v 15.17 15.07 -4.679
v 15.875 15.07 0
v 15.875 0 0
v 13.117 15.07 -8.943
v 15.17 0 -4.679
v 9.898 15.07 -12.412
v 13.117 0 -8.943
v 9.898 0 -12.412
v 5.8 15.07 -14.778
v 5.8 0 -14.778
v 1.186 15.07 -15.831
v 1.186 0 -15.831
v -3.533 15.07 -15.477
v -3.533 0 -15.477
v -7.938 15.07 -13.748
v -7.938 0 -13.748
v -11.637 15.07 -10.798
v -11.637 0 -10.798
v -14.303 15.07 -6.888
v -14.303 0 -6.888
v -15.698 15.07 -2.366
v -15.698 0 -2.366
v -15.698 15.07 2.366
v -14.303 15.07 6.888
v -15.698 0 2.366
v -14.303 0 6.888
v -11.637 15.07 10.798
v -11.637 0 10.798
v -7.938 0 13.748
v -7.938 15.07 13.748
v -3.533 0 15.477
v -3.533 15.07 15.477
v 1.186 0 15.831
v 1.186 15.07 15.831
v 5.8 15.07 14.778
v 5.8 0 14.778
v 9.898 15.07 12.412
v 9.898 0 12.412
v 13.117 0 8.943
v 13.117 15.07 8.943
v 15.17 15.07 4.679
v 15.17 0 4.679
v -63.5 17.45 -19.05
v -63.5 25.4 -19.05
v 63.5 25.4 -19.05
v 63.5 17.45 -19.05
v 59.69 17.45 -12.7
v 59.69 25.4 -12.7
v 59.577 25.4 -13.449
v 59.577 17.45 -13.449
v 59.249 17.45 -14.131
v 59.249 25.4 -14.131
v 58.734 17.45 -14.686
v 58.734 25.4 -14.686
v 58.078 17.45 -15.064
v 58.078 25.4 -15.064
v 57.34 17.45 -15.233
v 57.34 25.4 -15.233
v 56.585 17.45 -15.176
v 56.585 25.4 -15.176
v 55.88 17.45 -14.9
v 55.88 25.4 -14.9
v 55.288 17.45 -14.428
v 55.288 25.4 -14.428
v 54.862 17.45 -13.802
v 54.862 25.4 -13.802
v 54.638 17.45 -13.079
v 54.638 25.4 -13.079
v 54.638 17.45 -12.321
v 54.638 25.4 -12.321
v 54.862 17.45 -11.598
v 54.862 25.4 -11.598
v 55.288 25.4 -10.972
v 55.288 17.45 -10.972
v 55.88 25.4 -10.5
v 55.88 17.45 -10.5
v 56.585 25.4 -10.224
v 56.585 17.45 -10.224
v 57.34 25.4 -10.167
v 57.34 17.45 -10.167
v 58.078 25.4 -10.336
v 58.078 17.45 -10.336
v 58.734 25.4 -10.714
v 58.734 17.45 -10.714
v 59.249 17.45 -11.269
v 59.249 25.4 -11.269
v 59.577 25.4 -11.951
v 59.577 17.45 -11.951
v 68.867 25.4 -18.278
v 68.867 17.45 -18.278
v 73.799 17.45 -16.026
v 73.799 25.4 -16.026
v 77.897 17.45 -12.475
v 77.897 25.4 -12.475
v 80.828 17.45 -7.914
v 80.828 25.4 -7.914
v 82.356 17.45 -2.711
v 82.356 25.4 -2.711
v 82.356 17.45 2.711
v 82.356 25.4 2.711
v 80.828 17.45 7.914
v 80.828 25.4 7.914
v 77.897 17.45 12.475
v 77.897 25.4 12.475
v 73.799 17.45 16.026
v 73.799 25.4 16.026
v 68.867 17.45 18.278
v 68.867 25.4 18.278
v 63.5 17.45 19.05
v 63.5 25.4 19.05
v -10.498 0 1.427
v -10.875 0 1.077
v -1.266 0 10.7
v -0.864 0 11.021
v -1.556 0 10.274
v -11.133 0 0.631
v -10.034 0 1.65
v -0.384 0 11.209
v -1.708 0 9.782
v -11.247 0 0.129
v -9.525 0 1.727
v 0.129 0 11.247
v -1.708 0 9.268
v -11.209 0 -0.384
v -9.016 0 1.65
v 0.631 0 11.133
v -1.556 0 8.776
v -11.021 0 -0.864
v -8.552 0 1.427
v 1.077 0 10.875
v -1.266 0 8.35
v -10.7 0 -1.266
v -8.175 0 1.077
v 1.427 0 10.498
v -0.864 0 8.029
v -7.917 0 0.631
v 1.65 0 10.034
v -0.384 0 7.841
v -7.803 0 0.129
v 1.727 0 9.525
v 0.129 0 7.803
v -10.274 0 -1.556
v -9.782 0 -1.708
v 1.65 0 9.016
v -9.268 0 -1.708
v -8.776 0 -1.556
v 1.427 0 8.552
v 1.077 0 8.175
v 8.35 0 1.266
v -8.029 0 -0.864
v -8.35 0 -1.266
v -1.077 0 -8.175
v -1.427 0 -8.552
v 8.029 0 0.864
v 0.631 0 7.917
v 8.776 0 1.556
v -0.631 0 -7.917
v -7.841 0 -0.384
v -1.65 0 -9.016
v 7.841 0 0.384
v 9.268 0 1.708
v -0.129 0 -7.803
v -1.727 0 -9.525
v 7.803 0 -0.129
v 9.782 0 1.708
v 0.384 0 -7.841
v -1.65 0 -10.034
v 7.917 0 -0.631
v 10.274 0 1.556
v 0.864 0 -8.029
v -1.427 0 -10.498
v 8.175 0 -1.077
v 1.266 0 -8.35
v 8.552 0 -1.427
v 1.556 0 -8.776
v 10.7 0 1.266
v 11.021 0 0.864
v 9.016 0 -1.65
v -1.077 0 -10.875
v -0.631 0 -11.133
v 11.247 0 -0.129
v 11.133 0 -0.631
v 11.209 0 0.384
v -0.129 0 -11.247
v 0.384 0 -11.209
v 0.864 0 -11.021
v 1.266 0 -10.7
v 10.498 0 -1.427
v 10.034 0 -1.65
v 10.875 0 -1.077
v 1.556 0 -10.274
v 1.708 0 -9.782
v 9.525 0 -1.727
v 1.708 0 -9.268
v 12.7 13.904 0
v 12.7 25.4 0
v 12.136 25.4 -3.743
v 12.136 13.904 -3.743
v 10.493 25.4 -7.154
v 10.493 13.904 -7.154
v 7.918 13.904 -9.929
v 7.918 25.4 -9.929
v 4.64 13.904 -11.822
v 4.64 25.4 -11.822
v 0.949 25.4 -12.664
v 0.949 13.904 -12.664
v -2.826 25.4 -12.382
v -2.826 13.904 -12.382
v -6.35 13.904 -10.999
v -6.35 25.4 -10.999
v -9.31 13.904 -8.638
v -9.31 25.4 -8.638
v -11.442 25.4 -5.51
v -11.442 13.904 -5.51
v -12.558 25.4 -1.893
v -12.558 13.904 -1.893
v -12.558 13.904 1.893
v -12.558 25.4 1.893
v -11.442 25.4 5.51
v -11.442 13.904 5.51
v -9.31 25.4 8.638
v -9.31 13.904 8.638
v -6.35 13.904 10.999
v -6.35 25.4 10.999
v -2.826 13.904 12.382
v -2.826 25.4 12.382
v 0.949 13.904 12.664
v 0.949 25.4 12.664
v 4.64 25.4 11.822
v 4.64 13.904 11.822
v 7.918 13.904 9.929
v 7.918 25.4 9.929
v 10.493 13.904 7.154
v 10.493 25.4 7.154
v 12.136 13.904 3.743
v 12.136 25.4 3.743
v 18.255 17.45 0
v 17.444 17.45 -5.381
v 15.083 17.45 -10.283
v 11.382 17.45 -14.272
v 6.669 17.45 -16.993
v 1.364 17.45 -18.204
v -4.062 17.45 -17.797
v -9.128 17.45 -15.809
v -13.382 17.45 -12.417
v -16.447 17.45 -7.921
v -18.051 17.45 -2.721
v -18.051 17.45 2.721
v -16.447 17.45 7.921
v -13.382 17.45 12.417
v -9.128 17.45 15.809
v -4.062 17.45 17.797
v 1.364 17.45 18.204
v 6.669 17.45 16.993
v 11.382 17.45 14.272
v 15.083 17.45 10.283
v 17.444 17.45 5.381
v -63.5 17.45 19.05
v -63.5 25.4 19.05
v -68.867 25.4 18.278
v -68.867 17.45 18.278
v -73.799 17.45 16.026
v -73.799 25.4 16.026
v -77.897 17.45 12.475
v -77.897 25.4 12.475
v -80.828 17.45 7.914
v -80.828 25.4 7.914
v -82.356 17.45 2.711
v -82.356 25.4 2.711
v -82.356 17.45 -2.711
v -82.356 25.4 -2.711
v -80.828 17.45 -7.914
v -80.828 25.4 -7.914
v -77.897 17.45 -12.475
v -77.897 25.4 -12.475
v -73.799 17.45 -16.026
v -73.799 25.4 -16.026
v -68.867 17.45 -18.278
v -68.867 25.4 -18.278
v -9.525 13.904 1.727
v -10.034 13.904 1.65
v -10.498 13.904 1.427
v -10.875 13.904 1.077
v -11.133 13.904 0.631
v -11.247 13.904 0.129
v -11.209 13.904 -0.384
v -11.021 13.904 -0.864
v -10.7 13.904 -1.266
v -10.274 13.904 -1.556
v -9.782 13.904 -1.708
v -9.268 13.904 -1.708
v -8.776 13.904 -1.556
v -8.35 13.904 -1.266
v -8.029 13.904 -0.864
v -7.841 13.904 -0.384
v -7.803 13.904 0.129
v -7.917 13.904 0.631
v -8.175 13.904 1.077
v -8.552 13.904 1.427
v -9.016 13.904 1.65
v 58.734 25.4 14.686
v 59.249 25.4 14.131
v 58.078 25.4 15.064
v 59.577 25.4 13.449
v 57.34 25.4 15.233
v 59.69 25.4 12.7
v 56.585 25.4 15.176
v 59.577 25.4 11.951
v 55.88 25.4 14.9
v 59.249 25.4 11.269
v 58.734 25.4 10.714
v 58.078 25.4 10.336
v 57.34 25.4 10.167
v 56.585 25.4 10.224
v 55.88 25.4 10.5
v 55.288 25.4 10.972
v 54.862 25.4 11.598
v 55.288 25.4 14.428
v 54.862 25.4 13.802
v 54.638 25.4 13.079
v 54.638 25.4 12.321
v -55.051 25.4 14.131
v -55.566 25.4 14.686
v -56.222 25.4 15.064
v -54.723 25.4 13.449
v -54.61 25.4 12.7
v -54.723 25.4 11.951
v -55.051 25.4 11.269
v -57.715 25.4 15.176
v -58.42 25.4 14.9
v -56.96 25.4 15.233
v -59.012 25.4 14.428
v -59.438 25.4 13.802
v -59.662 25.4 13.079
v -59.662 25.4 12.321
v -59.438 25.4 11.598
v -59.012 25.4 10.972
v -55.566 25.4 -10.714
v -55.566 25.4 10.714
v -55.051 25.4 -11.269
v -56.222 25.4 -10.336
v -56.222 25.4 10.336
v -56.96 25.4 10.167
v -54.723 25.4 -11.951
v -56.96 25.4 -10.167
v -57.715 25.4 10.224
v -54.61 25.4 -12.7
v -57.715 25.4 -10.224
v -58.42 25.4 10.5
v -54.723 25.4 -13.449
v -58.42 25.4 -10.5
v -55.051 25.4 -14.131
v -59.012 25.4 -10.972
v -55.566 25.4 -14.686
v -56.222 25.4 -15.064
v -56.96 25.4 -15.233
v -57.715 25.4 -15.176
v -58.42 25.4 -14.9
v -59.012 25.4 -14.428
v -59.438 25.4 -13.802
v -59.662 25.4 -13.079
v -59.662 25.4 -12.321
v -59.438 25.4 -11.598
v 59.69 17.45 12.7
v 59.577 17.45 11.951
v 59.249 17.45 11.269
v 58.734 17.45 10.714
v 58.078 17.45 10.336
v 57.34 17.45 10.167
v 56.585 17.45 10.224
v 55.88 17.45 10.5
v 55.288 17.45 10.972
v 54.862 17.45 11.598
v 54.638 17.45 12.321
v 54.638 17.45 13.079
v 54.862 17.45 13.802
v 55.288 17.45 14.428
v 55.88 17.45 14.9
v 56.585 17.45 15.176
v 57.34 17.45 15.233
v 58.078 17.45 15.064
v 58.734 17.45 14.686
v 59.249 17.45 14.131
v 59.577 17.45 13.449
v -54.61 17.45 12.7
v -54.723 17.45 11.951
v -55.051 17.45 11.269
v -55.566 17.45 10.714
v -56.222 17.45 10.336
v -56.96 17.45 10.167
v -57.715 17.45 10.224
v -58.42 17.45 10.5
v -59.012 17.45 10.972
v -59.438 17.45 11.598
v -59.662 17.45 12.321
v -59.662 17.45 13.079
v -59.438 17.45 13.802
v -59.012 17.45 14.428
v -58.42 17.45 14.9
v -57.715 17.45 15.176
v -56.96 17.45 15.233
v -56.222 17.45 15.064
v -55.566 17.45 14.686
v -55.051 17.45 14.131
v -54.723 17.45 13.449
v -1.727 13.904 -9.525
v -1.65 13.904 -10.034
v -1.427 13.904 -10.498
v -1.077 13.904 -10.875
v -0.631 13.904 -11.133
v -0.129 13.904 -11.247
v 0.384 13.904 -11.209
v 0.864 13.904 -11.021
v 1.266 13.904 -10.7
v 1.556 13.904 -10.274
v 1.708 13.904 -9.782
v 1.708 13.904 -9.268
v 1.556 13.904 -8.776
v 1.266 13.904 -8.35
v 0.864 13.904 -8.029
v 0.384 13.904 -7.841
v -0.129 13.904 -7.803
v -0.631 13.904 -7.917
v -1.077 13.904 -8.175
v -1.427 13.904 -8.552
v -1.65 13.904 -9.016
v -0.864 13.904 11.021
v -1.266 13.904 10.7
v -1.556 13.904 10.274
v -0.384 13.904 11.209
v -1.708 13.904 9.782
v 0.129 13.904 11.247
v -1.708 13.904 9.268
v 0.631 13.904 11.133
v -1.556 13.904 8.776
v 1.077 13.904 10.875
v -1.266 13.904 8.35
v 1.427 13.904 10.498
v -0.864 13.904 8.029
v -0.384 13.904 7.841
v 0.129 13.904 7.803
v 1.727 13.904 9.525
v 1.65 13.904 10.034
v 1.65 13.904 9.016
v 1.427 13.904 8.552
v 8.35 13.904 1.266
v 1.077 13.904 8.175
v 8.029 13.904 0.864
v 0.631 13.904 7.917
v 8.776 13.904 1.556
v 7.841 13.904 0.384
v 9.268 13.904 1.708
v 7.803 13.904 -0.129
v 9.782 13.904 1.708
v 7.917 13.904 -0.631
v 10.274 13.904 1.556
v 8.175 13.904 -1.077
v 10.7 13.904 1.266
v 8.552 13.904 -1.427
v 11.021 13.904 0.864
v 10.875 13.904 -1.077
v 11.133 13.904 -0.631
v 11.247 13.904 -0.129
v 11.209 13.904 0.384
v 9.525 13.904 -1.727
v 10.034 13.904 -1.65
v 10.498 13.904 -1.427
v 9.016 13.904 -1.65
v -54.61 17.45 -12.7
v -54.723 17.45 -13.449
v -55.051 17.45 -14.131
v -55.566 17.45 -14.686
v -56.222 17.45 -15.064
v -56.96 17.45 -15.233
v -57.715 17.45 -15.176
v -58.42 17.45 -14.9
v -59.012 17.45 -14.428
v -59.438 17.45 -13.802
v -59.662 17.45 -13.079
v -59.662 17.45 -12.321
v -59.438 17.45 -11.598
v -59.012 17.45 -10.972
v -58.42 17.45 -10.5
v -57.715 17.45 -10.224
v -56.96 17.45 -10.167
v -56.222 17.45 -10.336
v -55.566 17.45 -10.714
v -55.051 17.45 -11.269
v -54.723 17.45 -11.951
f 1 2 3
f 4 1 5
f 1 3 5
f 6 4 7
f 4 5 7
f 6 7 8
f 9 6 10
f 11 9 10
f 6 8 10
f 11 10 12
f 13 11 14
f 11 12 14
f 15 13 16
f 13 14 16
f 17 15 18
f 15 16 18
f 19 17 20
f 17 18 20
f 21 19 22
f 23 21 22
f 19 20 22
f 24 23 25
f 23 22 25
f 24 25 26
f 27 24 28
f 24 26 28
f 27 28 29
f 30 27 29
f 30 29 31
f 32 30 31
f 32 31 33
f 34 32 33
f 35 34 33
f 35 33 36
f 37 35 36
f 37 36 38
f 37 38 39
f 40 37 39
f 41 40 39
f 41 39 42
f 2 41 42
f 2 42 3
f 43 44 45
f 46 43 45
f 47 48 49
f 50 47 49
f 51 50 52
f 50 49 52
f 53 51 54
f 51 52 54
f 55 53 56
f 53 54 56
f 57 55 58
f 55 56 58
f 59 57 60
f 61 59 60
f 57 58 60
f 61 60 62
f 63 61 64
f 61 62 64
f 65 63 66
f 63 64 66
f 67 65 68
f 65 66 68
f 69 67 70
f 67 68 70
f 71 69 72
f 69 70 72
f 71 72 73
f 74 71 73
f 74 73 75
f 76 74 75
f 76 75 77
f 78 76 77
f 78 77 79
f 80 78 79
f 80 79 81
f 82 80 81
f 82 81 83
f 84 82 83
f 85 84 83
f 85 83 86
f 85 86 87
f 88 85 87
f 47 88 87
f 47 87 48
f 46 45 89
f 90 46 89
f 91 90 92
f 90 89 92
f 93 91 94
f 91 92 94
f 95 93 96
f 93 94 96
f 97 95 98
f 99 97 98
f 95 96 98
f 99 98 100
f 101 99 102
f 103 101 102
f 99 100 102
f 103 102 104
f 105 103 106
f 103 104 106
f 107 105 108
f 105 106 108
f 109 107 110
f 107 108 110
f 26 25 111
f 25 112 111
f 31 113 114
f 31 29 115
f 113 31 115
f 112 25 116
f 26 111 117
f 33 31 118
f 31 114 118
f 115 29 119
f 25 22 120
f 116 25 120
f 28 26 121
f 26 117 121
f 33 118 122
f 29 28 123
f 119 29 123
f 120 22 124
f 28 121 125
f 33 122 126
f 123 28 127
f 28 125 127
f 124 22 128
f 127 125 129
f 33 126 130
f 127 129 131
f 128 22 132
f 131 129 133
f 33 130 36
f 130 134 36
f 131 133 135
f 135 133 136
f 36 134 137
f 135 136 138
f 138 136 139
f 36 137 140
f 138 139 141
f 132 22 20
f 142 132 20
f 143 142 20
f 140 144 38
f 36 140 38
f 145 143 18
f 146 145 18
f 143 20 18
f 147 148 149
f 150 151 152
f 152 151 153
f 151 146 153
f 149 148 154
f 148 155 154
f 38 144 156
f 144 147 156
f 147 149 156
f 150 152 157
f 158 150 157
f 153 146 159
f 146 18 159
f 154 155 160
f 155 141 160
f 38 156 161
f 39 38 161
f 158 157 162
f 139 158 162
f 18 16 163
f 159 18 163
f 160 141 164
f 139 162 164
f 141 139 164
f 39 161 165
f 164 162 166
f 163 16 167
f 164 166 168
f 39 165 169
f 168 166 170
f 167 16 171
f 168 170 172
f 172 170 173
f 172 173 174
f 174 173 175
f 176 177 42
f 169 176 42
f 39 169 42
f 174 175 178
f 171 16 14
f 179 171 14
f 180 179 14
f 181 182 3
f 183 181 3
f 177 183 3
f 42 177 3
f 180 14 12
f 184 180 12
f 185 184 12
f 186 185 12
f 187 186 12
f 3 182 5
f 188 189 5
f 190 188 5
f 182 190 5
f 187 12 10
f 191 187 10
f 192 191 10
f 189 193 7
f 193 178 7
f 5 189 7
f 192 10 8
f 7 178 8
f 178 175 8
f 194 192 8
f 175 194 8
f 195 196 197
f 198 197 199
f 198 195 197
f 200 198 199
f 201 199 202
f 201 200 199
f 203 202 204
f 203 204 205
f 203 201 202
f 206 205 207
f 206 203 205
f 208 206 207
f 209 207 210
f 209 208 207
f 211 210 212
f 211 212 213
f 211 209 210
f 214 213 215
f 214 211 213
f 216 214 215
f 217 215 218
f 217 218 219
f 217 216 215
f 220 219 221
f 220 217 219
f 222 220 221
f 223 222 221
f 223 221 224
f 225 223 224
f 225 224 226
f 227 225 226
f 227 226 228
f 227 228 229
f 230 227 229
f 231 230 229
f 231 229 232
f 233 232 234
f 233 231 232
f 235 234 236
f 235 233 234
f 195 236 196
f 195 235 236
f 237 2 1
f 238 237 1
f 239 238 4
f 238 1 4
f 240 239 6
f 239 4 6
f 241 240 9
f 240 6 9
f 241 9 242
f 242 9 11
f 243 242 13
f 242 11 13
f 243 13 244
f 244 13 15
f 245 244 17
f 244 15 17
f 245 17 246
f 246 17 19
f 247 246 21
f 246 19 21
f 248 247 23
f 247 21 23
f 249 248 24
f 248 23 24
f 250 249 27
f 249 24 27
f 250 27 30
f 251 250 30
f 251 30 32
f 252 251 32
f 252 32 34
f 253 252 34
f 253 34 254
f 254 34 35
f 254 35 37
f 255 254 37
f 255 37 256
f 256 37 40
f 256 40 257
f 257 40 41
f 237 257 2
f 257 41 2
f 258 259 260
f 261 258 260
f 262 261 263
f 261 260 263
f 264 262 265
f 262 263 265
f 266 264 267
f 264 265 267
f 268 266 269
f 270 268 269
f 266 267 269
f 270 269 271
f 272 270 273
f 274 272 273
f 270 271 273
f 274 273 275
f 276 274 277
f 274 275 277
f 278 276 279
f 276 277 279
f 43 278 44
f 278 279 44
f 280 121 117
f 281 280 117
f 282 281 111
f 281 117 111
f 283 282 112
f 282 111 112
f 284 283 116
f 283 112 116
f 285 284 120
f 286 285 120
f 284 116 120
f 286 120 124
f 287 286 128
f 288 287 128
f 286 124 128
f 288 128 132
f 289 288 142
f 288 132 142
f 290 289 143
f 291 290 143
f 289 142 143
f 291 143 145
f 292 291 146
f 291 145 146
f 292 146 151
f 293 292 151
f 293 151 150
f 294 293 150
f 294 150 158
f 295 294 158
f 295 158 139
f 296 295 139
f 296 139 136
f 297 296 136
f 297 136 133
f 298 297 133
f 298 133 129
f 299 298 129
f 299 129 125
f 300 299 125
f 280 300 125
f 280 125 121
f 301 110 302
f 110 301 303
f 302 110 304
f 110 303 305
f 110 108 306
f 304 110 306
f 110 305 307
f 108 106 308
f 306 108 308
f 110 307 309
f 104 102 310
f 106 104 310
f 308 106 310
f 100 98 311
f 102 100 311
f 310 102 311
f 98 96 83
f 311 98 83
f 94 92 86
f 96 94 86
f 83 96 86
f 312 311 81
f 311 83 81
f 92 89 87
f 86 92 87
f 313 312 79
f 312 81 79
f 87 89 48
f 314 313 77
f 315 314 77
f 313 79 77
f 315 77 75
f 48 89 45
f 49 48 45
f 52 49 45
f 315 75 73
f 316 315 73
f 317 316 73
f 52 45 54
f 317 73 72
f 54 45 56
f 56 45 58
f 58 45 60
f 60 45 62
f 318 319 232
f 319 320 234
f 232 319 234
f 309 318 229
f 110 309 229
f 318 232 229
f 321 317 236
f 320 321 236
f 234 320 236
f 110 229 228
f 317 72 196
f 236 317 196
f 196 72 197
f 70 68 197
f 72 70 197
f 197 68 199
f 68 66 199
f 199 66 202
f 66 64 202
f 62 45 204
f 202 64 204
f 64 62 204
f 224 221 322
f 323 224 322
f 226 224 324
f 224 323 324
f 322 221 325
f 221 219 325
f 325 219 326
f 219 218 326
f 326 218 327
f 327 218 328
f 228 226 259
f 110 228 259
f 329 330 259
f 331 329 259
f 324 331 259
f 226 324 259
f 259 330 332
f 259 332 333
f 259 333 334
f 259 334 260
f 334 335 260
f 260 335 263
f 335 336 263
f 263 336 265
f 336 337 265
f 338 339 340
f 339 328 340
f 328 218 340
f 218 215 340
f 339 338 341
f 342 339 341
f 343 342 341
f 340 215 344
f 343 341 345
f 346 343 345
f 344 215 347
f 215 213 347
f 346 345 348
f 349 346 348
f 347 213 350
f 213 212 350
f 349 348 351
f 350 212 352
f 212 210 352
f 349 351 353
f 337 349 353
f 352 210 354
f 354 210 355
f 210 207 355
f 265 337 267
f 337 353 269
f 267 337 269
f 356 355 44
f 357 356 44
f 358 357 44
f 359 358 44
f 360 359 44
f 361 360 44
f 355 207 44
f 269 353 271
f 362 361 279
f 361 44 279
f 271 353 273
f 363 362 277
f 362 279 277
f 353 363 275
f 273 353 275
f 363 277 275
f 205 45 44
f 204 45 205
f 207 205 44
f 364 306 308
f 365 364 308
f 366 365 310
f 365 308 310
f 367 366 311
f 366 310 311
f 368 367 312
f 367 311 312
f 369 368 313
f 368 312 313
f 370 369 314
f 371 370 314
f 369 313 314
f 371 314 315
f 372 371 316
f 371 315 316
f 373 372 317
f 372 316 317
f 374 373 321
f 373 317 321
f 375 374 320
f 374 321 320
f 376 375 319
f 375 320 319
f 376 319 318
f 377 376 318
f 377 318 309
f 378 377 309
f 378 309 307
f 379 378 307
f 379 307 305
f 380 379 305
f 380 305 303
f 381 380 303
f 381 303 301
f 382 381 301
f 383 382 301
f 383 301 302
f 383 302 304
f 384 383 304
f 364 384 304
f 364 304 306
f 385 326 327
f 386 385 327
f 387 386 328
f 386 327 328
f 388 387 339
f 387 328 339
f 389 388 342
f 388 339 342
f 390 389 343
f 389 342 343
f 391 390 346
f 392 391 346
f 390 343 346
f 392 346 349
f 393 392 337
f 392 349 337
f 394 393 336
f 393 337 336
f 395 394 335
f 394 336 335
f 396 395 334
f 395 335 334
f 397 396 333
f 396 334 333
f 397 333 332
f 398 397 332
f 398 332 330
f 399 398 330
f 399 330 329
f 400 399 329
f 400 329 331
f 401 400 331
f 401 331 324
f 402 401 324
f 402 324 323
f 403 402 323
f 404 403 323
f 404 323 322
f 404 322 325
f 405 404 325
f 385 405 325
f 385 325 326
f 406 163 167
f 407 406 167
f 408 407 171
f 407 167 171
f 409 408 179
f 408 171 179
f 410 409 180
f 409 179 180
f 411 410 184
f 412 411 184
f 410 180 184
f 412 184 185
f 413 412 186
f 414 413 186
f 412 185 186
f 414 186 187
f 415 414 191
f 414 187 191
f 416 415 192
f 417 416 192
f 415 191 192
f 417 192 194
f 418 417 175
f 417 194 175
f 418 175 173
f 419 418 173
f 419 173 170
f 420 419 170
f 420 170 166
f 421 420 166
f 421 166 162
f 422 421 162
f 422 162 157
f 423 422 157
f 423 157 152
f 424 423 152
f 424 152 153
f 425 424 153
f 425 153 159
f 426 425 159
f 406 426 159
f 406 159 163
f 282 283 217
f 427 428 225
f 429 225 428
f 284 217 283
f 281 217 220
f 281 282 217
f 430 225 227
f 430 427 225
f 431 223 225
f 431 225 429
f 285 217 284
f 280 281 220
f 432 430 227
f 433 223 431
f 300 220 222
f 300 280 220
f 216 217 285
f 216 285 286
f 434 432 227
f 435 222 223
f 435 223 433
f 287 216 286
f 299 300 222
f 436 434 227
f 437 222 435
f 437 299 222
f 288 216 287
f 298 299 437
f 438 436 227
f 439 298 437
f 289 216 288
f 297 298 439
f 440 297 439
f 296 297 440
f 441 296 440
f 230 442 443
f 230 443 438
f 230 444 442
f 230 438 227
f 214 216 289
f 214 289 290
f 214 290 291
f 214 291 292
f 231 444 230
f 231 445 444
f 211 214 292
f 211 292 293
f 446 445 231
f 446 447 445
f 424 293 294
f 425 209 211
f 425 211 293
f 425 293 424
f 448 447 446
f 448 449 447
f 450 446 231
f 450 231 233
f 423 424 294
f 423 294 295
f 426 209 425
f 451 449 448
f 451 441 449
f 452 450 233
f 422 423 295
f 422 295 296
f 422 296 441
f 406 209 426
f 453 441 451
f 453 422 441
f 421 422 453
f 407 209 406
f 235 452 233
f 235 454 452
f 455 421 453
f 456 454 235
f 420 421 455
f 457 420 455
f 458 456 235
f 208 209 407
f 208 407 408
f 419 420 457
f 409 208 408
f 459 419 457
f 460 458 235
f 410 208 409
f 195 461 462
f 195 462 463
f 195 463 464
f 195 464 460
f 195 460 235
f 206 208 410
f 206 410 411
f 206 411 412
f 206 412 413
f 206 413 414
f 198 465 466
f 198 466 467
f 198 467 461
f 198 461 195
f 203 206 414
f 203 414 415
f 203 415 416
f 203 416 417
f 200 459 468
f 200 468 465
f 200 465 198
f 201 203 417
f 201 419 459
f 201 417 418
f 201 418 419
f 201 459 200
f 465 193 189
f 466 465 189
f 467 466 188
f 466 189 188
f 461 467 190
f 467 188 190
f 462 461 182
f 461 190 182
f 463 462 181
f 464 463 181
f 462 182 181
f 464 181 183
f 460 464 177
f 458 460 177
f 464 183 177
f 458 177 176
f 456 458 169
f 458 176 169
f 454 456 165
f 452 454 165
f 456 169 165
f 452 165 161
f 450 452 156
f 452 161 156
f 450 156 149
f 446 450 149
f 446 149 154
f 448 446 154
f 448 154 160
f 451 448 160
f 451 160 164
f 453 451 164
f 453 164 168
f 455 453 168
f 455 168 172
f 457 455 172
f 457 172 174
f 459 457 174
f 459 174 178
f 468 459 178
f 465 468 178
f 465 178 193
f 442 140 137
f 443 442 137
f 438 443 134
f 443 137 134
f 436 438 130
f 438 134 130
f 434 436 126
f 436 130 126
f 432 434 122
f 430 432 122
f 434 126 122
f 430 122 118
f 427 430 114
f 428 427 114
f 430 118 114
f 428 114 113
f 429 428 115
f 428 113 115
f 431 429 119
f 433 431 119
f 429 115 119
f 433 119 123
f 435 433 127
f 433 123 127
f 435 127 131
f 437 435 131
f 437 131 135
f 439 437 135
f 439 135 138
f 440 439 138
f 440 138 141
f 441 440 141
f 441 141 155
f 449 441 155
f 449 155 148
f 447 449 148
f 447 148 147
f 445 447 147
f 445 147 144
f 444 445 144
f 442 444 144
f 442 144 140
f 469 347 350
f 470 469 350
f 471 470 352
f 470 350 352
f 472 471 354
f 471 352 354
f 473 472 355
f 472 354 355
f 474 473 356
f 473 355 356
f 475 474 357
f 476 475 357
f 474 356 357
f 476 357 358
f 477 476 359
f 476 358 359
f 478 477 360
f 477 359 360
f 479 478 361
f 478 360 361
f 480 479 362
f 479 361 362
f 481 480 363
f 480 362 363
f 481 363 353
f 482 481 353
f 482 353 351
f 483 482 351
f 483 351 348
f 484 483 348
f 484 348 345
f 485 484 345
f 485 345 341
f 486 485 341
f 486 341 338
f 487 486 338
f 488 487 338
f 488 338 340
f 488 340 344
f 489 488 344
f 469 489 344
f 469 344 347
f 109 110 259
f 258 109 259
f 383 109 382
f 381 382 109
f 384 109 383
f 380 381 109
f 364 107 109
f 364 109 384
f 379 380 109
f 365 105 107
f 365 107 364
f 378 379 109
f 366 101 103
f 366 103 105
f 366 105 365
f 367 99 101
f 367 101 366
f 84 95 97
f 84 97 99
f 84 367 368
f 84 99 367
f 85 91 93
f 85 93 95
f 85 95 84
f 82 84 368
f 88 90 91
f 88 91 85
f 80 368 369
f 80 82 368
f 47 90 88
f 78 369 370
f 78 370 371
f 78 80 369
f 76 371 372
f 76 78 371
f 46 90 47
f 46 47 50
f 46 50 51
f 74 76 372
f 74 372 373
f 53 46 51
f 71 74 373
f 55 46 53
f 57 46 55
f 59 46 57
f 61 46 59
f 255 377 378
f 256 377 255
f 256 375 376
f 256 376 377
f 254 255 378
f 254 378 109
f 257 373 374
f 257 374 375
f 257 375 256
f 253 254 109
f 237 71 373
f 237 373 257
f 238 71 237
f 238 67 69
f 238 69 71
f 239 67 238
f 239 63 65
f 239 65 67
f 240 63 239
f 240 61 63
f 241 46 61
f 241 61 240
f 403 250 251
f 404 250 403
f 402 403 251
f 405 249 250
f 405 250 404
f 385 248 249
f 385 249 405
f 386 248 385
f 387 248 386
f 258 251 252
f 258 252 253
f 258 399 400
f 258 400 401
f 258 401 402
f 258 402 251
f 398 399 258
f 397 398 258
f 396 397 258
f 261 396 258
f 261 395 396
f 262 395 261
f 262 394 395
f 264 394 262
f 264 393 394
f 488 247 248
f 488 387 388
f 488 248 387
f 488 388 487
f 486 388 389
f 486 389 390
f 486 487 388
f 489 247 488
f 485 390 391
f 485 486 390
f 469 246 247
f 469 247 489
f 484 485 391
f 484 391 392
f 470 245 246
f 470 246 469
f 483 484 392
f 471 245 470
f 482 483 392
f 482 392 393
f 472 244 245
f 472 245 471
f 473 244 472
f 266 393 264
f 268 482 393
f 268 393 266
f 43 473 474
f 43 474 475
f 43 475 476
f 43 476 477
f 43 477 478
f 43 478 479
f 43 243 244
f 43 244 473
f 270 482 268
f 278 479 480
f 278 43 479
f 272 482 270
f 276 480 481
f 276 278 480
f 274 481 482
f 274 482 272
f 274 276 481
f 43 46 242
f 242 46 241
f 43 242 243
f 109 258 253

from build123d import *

# Parameters (mm, degrees)
SKETCH1_R           = 15.875
BOSS_EXTRUDE1_DEPTH = 25.4
CUT_EXTRUDE5_START  = -11.49604
SKETCH2_R           = 12.7
CUT_EXTRUDE5_DEPTH  = 11.49604
SKETCH3_R           = 1.7272
CUT_EXTRUDE6_DEPTH  = 26.4
CIRPATTERN3_COUNT   = 4
SKETCH6_R           = 15.875
BOSS_EXTRUDE2_DEPTH = 7.9502
SKETCH7_R           = 2.54
CUT_EXTRUDE7_DEPTH  = 26.4
CHAMFER1_SIZE       = 2.38


with BuildPart() as part:
    # Sketch1 → Boss-Extrude1 (new body)
    with BuildSketch(Plane(origin=(0, 0, 0), x_dir=(1, 0, 0), z_dir=(0, 1, 0))):
        Circle(SKETCH1_R)
    extrude(amount=BOSS_EXTRUDE1_DEPTH)

    # Sketch2 → Cut-Extrude5 (cut)
    with BuildSketch(Plane(origin=(0, 25.4, 0), x_dir=(1, 0, 0), z_dir=(0, 1, 0)).offset(CUT_EXTRUDE5_START)):
        Circle(SKETCH2_R)
    extrude(amount=CUT_EXTRUDE5_DEPTH, mode=Mode.SUBTRACT)

    # Sketch3 → Cut-Extrude6 (cut, through all)
    with BuildSketch(Plane.XZ):
        with Locations((0, 9.525)):
            Circle(SKETCH3_R)
    cut_extrude6 = extrude(amount=-CUT_EXTRUDE6_DEPTH, mode=Mode.SUBTRACT)

    # CirPattern3: Cut-Extrude6 ×4 about axis
    cirpattern3_axis = Axis((0, 0, 0), (0, 1, 0))
    for i in range(1, CIRPATTERN3_COUNT):
        add(cut_extrude6.rotate(cirpattern3_axis, i * 360 / CIRPATTERN3_COUNT), mode=Mode.SUBTRACT)

    # Sketch6 → Boss-Extrude2 (add)
    with BuildSketch(Plane(origin=(0, 25.4, 0), x_dir=(1, 0, 0), z_dir=(0, 1, 0))):
        with BuildLine():
            Line((-63.5, 19.05), (63.5, 19.05))
            ThreePointArc((63.5, 19.05), (82.55, 0), (63.5, -19.05))
            Line((63.5, -19.05), (-63.5, -19.05))
            ThreePointArc((-63.5, -19.05), (-82.55, 0), (-63.5, 19.05))
        make_face()
        Circle(SKETCH6_R, mode=Mode.SUBTRACT)
    extrude(amount=-BOSS_EXTRUDE2_DEPTH)

    # Sketch7 → Cut-Extrude7 (cut, through all)
    with BuildSketch(Plane(origin=(0, 25.4, 0), x_dir=(1, 0, 0), z_dir=(0, 1, 0))):
        with Locations((57.15, 12.7)):
            Circle(SKETCH7_R)
        with Locations((57.15, -12.7)):
            Circle(SKETCH7_R)
        with Locations((-57.15, -12.7)):
            Circle(SKETCH7_R)
        with Locations((-57.15, 12.7)):
            Circle(SKETCH7_R)
    extrude(amount=-CUT_EXTRUDE7_DEPTH, mode=Mode.SUBTRACT)

    # Chamfer1
    chamfer1_edges = [part.edges().sort_by_distance(p)[0] for p in [
        (-15.875, 17.4498, 0),
    ]]
    chamfer(chamfer1_edges, length=CHAMFER1_SIZE)


solid = part.part
